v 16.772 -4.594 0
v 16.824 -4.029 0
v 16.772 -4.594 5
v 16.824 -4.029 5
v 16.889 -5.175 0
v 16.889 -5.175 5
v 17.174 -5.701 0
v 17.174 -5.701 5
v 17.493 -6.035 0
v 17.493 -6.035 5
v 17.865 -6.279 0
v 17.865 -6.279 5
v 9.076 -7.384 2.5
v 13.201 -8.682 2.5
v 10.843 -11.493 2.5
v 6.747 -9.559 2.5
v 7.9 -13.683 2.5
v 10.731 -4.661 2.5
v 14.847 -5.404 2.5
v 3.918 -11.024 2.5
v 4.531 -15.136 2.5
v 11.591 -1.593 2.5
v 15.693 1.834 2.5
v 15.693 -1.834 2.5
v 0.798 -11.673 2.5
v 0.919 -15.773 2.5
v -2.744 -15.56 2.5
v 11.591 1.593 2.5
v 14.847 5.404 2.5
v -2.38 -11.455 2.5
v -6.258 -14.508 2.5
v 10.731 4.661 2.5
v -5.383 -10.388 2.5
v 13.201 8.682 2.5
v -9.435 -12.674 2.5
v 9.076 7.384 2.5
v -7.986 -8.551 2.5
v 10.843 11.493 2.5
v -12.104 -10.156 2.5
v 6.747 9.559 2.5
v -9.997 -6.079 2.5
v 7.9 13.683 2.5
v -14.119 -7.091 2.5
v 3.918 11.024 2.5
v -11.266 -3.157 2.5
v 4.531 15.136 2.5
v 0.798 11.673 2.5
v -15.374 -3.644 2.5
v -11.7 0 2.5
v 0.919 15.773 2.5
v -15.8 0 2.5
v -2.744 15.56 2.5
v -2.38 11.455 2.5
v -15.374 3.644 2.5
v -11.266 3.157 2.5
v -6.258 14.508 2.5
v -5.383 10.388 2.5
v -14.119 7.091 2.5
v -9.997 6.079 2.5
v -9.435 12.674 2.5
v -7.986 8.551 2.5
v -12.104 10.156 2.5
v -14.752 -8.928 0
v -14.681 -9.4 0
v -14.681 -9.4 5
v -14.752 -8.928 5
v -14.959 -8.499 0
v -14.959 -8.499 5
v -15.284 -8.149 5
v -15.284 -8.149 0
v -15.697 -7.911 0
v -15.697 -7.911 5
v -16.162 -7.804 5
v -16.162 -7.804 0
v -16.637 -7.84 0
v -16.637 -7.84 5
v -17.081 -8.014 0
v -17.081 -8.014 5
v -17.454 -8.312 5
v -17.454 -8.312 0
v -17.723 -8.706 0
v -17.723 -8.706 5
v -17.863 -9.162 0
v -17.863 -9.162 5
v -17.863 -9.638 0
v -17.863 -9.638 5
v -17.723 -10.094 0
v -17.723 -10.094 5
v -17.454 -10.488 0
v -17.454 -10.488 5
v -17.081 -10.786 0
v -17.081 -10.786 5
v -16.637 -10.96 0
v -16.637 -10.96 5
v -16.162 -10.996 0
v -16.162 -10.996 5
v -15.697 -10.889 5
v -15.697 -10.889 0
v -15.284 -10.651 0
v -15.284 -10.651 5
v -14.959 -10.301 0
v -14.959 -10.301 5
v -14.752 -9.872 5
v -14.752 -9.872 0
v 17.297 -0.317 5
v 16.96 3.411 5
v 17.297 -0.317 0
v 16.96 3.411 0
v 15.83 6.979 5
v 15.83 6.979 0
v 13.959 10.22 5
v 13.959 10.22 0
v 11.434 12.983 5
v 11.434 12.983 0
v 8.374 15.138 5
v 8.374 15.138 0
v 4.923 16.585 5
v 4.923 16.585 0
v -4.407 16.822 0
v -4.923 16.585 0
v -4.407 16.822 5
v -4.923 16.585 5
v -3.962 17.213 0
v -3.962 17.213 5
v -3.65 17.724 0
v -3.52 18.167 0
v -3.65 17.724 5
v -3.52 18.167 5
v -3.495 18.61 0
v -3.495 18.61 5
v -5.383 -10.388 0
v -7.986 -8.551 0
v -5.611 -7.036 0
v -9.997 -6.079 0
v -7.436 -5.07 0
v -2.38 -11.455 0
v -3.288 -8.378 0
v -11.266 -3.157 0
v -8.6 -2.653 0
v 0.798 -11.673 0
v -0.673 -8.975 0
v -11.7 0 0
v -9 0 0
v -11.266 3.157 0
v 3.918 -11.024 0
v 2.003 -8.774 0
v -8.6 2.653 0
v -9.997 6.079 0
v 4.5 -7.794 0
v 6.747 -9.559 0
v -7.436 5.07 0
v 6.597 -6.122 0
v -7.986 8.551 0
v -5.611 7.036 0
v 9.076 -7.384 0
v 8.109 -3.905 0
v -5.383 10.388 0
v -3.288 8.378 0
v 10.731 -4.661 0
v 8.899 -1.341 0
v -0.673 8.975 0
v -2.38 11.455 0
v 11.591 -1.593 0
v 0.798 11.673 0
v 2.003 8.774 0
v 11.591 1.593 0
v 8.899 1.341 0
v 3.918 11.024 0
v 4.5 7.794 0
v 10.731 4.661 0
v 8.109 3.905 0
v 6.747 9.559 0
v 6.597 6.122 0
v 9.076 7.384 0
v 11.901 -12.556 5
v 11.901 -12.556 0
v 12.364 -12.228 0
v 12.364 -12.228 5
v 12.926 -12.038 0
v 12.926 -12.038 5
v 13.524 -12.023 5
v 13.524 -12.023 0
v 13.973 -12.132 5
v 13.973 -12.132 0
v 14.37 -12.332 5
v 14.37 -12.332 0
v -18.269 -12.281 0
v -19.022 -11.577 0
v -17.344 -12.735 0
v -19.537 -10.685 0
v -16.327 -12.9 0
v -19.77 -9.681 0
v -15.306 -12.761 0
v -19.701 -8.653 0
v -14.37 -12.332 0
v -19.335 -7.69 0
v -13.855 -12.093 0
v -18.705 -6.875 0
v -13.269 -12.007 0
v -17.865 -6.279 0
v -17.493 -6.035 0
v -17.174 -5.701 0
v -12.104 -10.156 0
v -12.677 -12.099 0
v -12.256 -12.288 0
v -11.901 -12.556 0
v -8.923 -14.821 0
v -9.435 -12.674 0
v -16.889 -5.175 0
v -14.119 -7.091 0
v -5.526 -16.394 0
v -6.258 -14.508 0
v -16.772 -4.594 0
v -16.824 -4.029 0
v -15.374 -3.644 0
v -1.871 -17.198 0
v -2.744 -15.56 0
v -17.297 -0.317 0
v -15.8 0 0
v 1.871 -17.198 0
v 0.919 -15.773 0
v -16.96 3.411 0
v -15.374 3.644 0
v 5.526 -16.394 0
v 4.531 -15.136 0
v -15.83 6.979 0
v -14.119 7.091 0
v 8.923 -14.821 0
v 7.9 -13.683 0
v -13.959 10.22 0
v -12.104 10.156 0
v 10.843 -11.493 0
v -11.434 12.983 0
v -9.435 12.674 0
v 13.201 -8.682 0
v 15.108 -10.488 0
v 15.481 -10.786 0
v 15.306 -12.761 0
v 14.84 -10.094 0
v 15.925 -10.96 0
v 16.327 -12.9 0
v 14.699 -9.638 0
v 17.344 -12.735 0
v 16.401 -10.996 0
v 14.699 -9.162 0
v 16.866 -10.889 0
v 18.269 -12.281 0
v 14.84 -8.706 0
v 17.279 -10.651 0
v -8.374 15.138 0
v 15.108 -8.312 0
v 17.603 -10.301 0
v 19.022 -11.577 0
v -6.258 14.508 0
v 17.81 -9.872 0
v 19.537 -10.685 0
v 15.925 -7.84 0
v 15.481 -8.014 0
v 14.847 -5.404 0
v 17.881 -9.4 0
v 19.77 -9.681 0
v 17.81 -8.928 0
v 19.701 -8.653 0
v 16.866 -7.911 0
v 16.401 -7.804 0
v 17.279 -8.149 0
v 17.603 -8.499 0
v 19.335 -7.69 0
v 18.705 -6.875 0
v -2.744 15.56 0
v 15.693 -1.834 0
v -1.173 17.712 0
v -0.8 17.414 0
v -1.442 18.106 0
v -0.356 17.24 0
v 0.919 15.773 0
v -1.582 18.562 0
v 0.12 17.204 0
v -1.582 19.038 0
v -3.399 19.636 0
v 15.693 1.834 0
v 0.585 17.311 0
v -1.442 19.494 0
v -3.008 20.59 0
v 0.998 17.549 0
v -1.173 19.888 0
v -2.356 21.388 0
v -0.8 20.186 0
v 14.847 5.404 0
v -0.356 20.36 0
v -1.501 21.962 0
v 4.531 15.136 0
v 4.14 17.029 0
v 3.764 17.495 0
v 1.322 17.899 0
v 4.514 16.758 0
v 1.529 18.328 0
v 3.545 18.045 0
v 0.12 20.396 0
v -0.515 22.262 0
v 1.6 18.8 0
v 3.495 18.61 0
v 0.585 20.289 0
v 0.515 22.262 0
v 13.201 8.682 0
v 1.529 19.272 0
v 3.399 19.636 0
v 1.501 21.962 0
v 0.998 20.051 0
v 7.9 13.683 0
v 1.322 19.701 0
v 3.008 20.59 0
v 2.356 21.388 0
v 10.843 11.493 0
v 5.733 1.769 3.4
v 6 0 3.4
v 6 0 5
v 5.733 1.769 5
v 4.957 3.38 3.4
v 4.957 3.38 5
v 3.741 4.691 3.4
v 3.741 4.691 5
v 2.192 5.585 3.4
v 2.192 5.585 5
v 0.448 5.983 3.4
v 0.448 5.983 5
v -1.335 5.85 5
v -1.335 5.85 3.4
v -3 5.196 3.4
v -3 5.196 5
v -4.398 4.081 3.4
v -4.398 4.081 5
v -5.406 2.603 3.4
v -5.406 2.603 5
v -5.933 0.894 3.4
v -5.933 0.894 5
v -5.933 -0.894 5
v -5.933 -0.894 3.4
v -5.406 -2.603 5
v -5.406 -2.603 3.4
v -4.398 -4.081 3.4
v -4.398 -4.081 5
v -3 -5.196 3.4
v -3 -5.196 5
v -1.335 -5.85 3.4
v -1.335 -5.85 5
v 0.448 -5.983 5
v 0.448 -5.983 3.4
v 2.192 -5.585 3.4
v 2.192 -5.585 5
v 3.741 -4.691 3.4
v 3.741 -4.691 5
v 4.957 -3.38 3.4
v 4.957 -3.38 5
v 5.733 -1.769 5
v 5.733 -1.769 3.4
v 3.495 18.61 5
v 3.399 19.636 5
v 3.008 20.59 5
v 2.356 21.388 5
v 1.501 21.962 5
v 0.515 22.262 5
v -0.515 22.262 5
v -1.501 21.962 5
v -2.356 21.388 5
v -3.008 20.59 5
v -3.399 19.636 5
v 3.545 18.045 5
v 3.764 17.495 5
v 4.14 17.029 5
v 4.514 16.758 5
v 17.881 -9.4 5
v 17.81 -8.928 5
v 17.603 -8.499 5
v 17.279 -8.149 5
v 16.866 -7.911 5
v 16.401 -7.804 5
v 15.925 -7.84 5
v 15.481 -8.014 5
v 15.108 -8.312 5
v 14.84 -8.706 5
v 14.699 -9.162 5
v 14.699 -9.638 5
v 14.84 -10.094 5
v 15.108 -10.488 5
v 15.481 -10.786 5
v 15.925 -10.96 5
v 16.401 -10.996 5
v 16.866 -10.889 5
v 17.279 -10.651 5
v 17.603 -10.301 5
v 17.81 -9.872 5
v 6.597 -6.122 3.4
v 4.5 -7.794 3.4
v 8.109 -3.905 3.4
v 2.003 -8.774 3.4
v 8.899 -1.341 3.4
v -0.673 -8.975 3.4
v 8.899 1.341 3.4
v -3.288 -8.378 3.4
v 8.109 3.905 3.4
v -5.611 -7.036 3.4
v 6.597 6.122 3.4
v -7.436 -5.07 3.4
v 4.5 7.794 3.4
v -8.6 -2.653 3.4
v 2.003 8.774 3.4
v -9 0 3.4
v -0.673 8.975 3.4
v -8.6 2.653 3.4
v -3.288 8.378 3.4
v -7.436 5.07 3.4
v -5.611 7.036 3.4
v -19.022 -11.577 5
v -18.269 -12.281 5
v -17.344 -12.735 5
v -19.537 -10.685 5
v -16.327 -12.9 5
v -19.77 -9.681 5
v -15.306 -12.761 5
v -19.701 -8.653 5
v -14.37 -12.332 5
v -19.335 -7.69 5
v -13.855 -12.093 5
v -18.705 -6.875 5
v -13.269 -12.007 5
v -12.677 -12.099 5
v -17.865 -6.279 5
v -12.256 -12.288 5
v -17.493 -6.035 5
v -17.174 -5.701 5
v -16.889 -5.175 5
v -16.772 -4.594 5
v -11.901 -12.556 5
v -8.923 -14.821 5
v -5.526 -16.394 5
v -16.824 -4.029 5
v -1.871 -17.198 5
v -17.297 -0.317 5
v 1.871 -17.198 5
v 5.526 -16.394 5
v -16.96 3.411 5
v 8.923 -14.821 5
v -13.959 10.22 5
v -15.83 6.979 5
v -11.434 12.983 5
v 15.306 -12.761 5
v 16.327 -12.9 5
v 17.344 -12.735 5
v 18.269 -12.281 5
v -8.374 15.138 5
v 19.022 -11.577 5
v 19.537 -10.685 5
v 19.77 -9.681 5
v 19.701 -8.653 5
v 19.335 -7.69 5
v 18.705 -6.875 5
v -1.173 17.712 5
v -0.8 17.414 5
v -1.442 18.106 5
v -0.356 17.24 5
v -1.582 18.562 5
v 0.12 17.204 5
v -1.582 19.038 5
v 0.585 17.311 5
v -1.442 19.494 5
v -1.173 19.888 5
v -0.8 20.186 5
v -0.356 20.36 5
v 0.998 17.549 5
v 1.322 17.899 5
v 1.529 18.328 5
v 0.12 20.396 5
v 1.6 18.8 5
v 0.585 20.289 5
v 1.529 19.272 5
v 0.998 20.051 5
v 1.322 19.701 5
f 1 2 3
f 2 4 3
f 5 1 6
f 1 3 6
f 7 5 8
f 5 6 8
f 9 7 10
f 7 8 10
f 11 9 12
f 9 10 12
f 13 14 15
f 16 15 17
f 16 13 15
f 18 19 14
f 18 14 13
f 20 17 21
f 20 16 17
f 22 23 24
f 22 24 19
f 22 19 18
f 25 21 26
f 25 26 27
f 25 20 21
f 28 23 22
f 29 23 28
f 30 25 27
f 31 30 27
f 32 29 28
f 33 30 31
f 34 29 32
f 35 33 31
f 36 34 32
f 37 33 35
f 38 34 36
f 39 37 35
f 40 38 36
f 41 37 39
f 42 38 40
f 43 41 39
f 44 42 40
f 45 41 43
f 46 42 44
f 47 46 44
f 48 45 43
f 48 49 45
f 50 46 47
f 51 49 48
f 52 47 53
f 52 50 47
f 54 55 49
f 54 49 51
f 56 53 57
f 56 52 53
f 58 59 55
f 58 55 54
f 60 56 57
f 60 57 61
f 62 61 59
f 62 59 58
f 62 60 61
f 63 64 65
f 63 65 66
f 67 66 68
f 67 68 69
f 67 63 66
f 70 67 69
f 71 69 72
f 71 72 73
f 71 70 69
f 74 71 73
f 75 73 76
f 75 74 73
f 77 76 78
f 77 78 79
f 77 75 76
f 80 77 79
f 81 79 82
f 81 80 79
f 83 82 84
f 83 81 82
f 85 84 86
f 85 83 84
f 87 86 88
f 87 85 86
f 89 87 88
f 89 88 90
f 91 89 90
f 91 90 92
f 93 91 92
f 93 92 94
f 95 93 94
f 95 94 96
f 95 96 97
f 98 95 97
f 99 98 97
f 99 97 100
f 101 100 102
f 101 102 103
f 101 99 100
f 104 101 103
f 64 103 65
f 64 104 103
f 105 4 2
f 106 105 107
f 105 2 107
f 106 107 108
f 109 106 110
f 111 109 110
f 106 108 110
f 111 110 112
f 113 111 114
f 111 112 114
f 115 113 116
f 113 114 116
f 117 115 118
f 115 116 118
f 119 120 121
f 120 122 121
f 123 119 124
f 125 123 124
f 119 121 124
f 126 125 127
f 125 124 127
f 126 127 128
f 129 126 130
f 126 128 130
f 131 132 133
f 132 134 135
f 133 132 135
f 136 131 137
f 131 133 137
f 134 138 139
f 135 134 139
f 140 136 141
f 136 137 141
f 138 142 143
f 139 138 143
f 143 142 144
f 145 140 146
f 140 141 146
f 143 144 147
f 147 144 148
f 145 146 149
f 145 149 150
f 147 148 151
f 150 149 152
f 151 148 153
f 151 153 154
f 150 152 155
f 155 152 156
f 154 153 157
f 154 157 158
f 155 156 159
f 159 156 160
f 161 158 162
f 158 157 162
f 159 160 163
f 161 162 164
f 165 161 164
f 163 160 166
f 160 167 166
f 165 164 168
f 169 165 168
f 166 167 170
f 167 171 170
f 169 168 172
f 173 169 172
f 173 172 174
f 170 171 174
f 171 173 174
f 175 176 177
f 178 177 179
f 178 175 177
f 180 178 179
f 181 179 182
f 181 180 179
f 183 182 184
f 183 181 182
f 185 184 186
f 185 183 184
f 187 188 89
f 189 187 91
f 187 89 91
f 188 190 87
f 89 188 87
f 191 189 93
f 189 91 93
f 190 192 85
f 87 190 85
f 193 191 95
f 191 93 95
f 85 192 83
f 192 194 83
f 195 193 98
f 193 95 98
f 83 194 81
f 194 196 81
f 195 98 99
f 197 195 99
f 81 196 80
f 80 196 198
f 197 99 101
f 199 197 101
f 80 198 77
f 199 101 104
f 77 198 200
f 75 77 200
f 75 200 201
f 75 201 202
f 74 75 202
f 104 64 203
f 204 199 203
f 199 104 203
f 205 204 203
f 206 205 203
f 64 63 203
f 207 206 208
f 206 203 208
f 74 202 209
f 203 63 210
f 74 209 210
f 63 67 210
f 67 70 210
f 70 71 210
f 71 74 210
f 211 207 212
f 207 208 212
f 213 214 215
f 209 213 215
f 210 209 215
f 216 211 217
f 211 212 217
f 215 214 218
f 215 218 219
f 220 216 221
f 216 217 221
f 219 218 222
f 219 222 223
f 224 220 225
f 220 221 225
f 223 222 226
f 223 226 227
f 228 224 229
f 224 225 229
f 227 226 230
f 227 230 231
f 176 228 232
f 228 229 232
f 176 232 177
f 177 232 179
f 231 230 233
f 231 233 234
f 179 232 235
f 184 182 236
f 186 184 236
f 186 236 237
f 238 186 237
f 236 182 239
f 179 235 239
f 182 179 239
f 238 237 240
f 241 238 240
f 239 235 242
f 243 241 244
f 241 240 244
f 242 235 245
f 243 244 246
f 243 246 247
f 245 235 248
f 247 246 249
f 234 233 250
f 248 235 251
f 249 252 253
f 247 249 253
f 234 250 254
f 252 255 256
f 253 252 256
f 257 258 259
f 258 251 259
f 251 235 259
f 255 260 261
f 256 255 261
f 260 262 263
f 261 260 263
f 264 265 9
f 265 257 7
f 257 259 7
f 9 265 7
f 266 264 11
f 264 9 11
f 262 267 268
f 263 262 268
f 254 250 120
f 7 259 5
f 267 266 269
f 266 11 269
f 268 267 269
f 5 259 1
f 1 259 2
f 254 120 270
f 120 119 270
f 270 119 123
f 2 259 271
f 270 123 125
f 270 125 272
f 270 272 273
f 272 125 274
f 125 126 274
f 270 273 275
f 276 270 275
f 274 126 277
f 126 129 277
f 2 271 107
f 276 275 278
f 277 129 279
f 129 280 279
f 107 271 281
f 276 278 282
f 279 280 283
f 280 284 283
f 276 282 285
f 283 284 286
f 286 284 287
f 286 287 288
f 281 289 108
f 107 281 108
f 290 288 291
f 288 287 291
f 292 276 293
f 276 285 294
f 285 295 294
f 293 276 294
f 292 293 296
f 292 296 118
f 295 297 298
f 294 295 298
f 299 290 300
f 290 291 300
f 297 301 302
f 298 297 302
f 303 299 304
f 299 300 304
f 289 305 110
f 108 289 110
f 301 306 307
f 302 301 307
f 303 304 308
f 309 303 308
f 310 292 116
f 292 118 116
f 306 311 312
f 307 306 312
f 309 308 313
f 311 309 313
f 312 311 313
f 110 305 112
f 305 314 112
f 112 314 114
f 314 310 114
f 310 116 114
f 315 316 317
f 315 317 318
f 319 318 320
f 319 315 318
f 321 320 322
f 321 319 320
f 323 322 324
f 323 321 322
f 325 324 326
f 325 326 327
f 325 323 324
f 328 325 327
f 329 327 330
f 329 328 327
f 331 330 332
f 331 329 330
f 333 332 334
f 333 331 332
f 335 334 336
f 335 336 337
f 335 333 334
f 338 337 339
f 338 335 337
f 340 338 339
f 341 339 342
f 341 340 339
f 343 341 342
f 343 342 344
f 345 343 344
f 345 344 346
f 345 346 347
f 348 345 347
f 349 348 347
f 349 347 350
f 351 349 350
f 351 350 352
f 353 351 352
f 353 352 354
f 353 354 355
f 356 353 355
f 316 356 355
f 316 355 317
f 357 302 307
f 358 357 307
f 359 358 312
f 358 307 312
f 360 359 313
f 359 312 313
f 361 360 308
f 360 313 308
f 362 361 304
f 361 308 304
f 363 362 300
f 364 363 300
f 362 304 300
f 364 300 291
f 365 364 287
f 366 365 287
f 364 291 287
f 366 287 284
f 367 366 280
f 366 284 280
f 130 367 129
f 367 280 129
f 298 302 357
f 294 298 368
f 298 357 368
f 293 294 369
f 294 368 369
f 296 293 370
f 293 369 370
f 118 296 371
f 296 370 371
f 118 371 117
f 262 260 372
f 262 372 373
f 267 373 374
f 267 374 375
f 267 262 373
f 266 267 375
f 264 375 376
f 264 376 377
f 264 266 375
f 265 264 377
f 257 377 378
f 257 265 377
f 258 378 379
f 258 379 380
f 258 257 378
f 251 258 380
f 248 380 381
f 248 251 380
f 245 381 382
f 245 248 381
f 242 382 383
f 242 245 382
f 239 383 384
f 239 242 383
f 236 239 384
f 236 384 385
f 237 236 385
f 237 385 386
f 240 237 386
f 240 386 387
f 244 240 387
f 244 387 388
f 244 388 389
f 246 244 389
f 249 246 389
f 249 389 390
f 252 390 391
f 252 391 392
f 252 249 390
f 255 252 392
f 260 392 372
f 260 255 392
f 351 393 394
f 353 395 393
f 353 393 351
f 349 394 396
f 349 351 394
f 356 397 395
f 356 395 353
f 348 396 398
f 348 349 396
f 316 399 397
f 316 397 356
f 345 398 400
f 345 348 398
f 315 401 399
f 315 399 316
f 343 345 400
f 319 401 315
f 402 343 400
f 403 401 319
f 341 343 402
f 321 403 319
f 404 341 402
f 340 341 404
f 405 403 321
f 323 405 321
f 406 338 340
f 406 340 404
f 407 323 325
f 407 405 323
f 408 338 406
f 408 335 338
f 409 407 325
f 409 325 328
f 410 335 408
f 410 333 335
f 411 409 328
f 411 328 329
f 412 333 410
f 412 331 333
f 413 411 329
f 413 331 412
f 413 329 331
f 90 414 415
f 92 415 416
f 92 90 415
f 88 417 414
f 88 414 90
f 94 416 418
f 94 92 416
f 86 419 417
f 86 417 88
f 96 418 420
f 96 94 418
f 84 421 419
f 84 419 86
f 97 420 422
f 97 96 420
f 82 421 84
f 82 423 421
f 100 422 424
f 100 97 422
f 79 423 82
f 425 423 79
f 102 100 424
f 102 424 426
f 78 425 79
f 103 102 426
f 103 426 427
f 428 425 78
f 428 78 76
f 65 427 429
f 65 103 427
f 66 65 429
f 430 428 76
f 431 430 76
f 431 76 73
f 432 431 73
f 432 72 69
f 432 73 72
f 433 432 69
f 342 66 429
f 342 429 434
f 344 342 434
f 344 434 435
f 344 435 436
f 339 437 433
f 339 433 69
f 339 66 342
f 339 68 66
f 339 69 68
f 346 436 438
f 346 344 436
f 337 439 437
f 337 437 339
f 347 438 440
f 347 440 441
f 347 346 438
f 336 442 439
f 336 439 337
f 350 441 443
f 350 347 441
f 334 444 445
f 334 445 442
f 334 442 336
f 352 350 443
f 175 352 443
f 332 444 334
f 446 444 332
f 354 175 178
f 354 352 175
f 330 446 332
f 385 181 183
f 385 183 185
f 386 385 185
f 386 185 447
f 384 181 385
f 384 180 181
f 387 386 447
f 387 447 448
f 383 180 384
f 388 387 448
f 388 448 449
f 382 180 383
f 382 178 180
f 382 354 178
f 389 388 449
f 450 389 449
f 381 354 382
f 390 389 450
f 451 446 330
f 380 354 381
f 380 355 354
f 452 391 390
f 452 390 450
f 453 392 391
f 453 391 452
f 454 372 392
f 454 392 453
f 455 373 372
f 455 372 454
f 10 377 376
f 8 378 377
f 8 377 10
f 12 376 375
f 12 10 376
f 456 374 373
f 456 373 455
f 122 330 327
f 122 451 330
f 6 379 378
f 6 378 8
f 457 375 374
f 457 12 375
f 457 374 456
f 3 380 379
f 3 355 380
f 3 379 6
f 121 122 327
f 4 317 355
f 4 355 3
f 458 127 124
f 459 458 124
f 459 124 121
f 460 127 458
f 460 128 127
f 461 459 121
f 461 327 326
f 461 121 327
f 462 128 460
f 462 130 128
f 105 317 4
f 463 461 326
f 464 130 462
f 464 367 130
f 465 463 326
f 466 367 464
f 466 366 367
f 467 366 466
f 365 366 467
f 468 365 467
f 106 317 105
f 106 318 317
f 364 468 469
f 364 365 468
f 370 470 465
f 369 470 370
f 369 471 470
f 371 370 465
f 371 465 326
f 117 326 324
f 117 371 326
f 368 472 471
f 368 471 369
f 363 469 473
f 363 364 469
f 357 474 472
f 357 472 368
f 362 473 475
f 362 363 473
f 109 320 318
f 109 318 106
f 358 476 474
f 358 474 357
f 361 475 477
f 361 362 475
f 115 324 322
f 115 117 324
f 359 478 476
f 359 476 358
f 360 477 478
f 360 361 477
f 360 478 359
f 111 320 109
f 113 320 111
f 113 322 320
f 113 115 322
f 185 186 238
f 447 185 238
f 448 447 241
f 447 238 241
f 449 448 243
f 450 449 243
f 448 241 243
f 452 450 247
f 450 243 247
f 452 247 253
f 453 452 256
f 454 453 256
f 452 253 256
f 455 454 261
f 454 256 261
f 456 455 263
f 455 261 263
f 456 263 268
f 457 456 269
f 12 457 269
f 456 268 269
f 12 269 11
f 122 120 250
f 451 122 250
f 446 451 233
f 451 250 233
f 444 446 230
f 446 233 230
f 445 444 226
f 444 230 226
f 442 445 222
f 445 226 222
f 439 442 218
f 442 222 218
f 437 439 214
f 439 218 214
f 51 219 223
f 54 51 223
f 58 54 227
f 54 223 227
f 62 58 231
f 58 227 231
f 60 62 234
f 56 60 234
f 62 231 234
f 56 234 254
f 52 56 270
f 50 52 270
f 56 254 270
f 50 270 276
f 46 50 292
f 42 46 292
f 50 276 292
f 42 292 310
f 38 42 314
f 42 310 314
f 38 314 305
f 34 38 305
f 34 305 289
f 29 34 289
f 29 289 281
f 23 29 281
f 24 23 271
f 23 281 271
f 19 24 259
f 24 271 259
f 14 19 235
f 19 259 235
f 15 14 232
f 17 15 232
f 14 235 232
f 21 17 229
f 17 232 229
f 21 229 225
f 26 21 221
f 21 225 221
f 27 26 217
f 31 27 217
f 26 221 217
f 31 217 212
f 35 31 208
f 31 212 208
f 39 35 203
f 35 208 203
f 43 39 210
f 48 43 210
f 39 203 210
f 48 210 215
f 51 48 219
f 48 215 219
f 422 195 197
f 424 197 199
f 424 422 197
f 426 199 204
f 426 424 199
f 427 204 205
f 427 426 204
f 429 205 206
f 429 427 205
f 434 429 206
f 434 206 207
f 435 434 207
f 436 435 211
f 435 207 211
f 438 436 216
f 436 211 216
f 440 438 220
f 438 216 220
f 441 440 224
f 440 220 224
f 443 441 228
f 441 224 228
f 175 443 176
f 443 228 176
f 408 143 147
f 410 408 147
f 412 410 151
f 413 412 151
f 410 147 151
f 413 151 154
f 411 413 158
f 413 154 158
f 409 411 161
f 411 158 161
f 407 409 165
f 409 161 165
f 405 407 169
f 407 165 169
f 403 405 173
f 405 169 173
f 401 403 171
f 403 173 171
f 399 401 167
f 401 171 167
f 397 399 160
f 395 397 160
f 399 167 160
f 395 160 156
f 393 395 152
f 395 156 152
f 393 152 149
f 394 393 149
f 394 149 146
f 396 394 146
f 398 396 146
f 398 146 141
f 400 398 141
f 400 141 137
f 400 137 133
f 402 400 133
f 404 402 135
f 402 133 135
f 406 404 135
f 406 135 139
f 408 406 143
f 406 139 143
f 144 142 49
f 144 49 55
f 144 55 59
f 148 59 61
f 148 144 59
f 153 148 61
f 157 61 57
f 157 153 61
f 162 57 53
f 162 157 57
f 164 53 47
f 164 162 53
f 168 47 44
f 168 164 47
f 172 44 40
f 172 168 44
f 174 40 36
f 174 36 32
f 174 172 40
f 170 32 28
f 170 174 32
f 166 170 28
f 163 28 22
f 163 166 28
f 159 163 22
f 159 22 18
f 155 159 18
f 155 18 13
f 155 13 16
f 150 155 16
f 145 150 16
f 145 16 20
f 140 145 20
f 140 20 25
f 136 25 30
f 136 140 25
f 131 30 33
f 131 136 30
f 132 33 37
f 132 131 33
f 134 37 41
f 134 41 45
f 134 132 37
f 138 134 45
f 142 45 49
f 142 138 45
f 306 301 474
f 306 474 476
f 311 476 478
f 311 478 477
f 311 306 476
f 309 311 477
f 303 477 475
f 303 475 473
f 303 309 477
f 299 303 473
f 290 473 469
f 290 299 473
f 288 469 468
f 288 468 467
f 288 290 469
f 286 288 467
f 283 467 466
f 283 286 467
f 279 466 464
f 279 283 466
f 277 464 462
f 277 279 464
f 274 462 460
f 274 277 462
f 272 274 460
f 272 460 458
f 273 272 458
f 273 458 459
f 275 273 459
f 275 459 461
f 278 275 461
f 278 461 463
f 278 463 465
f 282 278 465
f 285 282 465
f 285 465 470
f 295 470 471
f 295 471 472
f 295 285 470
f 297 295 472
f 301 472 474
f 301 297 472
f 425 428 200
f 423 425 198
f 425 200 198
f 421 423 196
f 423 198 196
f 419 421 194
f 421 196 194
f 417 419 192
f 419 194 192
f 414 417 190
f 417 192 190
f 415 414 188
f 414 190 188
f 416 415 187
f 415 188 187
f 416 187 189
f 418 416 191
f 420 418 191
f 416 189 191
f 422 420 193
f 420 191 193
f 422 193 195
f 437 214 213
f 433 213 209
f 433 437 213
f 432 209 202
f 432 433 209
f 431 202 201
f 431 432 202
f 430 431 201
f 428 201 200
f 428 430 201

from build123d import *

# Parameters (mm, degrees)
SKETCH_1_R          = 6
SKETCH_1_R_2        = 1.6
EXTRUDE_1_DEPTH     = 5
FILLET_1_R          = 2
SKETCH_3_R          = 15.8
SKETCH_3_R_2        = 11.7
CUT_EXTRUDE_1_DEPTH = 2.5
SKETCH_4_R          = 9
CUT_EXTRUDE_2_DEPTH = 3.4


with BuildPart() as part:
    # ｽｹｯﾁ1 → ﾎﾞｽ - 押し出し1 (new body)
    with BuildSketch(Plane.XY):
        with BuildLine():
            ThreePointArc((-3.021819699, 17.034042553), (-14.982239485, 8.65), (-16.26282343, -5.900048651))
            ThreePointArc((-16.26282343, -5.900048651), (-19.312366504, -11.15), (-13.24100373, -11.133993902))
            ThreePointArc((-13.24100373, -11.133993902), (0, -17.3), (13.24100373, -11.133993902))
            ThreePointArc((13.24100373, -11.133993902), (19.312366504, -11.15), (16.26282343, -5.900048651))
            ThreePointArc((16.26282343, -5.900048651), (14.982239485, 8.65), (3.021819699, 17.034042553))
            ThreePointArc((3.021819699, 17.034042553), (0, 22.3), (-3.021819699, 17.034042553))
        make_face()
        Circle(SKETCH_1_R, mode=Mode.SUBTRACT)
        with Locations((0, 18.8)):
            Circle(SKETCH_1_R_2, mode=Mode.SUBTRACT)
        with Locations((16.281277591, -9.4)):
            Circle(SKETCH_1_R_2, mode=Mode.SUBTRACT)
        with Locations((-16.281277591, -9.4)):
            Circle(SKETCH_1_R_2, mode=Mode.SUBTRACT)
    extrude(amount=EXTRUDE_1_DEPTH)

    # ﾌｨﾚｯﾄ1
    fillet_1_edges = [part.edges().sort_by_distance(p)[0] for p in [
        (16.26282343, -5.900048651, 2.5),
        (13.24100373, -11.133993902, 2.5),
        (-13.24100373, -11.133993902, 2.5),
        (-16.26282343, -5.900048651, 2.5),
        (-3.021819699, 17.034042553, 2.5),
        (3.021819699, 17.034042553, 2.5),
    ]]
    fillet(fillet_1_edges, radius=FILLET_1_R)

    # ｽｹｯﾁ3 → ｶｯﾄ - 押し出し1 (cut)
    with BuildSketch(Plane(origin=(0, 0, 0), x_dir=(-1, 0, 0), z_dir=(0, 0, -1))):
        Circle(SKETCH_3_R)
        Circle(SKETCH_3_R_2, mode=Mode.SUBTRACT)
    extrude(amount=-CUT_EXTRUDE_1_DEPTH, mode=Mode.SUBTRACT)

    # ｽｹｯﾁ4 → ｶｯﾄ - 押し出し2 (cut)
    with BuildSketch(Plane(origin=(0, 0, 0), x_dir=(-1, 0, 0), z_dir=(0, 0, -1))):
        Circle(SKETCH_4_R)
    extrude(amount=-CUT_EXTRUDE_2_DEPTH, mode=Mode.SUBTRACT)


solid = part.part
